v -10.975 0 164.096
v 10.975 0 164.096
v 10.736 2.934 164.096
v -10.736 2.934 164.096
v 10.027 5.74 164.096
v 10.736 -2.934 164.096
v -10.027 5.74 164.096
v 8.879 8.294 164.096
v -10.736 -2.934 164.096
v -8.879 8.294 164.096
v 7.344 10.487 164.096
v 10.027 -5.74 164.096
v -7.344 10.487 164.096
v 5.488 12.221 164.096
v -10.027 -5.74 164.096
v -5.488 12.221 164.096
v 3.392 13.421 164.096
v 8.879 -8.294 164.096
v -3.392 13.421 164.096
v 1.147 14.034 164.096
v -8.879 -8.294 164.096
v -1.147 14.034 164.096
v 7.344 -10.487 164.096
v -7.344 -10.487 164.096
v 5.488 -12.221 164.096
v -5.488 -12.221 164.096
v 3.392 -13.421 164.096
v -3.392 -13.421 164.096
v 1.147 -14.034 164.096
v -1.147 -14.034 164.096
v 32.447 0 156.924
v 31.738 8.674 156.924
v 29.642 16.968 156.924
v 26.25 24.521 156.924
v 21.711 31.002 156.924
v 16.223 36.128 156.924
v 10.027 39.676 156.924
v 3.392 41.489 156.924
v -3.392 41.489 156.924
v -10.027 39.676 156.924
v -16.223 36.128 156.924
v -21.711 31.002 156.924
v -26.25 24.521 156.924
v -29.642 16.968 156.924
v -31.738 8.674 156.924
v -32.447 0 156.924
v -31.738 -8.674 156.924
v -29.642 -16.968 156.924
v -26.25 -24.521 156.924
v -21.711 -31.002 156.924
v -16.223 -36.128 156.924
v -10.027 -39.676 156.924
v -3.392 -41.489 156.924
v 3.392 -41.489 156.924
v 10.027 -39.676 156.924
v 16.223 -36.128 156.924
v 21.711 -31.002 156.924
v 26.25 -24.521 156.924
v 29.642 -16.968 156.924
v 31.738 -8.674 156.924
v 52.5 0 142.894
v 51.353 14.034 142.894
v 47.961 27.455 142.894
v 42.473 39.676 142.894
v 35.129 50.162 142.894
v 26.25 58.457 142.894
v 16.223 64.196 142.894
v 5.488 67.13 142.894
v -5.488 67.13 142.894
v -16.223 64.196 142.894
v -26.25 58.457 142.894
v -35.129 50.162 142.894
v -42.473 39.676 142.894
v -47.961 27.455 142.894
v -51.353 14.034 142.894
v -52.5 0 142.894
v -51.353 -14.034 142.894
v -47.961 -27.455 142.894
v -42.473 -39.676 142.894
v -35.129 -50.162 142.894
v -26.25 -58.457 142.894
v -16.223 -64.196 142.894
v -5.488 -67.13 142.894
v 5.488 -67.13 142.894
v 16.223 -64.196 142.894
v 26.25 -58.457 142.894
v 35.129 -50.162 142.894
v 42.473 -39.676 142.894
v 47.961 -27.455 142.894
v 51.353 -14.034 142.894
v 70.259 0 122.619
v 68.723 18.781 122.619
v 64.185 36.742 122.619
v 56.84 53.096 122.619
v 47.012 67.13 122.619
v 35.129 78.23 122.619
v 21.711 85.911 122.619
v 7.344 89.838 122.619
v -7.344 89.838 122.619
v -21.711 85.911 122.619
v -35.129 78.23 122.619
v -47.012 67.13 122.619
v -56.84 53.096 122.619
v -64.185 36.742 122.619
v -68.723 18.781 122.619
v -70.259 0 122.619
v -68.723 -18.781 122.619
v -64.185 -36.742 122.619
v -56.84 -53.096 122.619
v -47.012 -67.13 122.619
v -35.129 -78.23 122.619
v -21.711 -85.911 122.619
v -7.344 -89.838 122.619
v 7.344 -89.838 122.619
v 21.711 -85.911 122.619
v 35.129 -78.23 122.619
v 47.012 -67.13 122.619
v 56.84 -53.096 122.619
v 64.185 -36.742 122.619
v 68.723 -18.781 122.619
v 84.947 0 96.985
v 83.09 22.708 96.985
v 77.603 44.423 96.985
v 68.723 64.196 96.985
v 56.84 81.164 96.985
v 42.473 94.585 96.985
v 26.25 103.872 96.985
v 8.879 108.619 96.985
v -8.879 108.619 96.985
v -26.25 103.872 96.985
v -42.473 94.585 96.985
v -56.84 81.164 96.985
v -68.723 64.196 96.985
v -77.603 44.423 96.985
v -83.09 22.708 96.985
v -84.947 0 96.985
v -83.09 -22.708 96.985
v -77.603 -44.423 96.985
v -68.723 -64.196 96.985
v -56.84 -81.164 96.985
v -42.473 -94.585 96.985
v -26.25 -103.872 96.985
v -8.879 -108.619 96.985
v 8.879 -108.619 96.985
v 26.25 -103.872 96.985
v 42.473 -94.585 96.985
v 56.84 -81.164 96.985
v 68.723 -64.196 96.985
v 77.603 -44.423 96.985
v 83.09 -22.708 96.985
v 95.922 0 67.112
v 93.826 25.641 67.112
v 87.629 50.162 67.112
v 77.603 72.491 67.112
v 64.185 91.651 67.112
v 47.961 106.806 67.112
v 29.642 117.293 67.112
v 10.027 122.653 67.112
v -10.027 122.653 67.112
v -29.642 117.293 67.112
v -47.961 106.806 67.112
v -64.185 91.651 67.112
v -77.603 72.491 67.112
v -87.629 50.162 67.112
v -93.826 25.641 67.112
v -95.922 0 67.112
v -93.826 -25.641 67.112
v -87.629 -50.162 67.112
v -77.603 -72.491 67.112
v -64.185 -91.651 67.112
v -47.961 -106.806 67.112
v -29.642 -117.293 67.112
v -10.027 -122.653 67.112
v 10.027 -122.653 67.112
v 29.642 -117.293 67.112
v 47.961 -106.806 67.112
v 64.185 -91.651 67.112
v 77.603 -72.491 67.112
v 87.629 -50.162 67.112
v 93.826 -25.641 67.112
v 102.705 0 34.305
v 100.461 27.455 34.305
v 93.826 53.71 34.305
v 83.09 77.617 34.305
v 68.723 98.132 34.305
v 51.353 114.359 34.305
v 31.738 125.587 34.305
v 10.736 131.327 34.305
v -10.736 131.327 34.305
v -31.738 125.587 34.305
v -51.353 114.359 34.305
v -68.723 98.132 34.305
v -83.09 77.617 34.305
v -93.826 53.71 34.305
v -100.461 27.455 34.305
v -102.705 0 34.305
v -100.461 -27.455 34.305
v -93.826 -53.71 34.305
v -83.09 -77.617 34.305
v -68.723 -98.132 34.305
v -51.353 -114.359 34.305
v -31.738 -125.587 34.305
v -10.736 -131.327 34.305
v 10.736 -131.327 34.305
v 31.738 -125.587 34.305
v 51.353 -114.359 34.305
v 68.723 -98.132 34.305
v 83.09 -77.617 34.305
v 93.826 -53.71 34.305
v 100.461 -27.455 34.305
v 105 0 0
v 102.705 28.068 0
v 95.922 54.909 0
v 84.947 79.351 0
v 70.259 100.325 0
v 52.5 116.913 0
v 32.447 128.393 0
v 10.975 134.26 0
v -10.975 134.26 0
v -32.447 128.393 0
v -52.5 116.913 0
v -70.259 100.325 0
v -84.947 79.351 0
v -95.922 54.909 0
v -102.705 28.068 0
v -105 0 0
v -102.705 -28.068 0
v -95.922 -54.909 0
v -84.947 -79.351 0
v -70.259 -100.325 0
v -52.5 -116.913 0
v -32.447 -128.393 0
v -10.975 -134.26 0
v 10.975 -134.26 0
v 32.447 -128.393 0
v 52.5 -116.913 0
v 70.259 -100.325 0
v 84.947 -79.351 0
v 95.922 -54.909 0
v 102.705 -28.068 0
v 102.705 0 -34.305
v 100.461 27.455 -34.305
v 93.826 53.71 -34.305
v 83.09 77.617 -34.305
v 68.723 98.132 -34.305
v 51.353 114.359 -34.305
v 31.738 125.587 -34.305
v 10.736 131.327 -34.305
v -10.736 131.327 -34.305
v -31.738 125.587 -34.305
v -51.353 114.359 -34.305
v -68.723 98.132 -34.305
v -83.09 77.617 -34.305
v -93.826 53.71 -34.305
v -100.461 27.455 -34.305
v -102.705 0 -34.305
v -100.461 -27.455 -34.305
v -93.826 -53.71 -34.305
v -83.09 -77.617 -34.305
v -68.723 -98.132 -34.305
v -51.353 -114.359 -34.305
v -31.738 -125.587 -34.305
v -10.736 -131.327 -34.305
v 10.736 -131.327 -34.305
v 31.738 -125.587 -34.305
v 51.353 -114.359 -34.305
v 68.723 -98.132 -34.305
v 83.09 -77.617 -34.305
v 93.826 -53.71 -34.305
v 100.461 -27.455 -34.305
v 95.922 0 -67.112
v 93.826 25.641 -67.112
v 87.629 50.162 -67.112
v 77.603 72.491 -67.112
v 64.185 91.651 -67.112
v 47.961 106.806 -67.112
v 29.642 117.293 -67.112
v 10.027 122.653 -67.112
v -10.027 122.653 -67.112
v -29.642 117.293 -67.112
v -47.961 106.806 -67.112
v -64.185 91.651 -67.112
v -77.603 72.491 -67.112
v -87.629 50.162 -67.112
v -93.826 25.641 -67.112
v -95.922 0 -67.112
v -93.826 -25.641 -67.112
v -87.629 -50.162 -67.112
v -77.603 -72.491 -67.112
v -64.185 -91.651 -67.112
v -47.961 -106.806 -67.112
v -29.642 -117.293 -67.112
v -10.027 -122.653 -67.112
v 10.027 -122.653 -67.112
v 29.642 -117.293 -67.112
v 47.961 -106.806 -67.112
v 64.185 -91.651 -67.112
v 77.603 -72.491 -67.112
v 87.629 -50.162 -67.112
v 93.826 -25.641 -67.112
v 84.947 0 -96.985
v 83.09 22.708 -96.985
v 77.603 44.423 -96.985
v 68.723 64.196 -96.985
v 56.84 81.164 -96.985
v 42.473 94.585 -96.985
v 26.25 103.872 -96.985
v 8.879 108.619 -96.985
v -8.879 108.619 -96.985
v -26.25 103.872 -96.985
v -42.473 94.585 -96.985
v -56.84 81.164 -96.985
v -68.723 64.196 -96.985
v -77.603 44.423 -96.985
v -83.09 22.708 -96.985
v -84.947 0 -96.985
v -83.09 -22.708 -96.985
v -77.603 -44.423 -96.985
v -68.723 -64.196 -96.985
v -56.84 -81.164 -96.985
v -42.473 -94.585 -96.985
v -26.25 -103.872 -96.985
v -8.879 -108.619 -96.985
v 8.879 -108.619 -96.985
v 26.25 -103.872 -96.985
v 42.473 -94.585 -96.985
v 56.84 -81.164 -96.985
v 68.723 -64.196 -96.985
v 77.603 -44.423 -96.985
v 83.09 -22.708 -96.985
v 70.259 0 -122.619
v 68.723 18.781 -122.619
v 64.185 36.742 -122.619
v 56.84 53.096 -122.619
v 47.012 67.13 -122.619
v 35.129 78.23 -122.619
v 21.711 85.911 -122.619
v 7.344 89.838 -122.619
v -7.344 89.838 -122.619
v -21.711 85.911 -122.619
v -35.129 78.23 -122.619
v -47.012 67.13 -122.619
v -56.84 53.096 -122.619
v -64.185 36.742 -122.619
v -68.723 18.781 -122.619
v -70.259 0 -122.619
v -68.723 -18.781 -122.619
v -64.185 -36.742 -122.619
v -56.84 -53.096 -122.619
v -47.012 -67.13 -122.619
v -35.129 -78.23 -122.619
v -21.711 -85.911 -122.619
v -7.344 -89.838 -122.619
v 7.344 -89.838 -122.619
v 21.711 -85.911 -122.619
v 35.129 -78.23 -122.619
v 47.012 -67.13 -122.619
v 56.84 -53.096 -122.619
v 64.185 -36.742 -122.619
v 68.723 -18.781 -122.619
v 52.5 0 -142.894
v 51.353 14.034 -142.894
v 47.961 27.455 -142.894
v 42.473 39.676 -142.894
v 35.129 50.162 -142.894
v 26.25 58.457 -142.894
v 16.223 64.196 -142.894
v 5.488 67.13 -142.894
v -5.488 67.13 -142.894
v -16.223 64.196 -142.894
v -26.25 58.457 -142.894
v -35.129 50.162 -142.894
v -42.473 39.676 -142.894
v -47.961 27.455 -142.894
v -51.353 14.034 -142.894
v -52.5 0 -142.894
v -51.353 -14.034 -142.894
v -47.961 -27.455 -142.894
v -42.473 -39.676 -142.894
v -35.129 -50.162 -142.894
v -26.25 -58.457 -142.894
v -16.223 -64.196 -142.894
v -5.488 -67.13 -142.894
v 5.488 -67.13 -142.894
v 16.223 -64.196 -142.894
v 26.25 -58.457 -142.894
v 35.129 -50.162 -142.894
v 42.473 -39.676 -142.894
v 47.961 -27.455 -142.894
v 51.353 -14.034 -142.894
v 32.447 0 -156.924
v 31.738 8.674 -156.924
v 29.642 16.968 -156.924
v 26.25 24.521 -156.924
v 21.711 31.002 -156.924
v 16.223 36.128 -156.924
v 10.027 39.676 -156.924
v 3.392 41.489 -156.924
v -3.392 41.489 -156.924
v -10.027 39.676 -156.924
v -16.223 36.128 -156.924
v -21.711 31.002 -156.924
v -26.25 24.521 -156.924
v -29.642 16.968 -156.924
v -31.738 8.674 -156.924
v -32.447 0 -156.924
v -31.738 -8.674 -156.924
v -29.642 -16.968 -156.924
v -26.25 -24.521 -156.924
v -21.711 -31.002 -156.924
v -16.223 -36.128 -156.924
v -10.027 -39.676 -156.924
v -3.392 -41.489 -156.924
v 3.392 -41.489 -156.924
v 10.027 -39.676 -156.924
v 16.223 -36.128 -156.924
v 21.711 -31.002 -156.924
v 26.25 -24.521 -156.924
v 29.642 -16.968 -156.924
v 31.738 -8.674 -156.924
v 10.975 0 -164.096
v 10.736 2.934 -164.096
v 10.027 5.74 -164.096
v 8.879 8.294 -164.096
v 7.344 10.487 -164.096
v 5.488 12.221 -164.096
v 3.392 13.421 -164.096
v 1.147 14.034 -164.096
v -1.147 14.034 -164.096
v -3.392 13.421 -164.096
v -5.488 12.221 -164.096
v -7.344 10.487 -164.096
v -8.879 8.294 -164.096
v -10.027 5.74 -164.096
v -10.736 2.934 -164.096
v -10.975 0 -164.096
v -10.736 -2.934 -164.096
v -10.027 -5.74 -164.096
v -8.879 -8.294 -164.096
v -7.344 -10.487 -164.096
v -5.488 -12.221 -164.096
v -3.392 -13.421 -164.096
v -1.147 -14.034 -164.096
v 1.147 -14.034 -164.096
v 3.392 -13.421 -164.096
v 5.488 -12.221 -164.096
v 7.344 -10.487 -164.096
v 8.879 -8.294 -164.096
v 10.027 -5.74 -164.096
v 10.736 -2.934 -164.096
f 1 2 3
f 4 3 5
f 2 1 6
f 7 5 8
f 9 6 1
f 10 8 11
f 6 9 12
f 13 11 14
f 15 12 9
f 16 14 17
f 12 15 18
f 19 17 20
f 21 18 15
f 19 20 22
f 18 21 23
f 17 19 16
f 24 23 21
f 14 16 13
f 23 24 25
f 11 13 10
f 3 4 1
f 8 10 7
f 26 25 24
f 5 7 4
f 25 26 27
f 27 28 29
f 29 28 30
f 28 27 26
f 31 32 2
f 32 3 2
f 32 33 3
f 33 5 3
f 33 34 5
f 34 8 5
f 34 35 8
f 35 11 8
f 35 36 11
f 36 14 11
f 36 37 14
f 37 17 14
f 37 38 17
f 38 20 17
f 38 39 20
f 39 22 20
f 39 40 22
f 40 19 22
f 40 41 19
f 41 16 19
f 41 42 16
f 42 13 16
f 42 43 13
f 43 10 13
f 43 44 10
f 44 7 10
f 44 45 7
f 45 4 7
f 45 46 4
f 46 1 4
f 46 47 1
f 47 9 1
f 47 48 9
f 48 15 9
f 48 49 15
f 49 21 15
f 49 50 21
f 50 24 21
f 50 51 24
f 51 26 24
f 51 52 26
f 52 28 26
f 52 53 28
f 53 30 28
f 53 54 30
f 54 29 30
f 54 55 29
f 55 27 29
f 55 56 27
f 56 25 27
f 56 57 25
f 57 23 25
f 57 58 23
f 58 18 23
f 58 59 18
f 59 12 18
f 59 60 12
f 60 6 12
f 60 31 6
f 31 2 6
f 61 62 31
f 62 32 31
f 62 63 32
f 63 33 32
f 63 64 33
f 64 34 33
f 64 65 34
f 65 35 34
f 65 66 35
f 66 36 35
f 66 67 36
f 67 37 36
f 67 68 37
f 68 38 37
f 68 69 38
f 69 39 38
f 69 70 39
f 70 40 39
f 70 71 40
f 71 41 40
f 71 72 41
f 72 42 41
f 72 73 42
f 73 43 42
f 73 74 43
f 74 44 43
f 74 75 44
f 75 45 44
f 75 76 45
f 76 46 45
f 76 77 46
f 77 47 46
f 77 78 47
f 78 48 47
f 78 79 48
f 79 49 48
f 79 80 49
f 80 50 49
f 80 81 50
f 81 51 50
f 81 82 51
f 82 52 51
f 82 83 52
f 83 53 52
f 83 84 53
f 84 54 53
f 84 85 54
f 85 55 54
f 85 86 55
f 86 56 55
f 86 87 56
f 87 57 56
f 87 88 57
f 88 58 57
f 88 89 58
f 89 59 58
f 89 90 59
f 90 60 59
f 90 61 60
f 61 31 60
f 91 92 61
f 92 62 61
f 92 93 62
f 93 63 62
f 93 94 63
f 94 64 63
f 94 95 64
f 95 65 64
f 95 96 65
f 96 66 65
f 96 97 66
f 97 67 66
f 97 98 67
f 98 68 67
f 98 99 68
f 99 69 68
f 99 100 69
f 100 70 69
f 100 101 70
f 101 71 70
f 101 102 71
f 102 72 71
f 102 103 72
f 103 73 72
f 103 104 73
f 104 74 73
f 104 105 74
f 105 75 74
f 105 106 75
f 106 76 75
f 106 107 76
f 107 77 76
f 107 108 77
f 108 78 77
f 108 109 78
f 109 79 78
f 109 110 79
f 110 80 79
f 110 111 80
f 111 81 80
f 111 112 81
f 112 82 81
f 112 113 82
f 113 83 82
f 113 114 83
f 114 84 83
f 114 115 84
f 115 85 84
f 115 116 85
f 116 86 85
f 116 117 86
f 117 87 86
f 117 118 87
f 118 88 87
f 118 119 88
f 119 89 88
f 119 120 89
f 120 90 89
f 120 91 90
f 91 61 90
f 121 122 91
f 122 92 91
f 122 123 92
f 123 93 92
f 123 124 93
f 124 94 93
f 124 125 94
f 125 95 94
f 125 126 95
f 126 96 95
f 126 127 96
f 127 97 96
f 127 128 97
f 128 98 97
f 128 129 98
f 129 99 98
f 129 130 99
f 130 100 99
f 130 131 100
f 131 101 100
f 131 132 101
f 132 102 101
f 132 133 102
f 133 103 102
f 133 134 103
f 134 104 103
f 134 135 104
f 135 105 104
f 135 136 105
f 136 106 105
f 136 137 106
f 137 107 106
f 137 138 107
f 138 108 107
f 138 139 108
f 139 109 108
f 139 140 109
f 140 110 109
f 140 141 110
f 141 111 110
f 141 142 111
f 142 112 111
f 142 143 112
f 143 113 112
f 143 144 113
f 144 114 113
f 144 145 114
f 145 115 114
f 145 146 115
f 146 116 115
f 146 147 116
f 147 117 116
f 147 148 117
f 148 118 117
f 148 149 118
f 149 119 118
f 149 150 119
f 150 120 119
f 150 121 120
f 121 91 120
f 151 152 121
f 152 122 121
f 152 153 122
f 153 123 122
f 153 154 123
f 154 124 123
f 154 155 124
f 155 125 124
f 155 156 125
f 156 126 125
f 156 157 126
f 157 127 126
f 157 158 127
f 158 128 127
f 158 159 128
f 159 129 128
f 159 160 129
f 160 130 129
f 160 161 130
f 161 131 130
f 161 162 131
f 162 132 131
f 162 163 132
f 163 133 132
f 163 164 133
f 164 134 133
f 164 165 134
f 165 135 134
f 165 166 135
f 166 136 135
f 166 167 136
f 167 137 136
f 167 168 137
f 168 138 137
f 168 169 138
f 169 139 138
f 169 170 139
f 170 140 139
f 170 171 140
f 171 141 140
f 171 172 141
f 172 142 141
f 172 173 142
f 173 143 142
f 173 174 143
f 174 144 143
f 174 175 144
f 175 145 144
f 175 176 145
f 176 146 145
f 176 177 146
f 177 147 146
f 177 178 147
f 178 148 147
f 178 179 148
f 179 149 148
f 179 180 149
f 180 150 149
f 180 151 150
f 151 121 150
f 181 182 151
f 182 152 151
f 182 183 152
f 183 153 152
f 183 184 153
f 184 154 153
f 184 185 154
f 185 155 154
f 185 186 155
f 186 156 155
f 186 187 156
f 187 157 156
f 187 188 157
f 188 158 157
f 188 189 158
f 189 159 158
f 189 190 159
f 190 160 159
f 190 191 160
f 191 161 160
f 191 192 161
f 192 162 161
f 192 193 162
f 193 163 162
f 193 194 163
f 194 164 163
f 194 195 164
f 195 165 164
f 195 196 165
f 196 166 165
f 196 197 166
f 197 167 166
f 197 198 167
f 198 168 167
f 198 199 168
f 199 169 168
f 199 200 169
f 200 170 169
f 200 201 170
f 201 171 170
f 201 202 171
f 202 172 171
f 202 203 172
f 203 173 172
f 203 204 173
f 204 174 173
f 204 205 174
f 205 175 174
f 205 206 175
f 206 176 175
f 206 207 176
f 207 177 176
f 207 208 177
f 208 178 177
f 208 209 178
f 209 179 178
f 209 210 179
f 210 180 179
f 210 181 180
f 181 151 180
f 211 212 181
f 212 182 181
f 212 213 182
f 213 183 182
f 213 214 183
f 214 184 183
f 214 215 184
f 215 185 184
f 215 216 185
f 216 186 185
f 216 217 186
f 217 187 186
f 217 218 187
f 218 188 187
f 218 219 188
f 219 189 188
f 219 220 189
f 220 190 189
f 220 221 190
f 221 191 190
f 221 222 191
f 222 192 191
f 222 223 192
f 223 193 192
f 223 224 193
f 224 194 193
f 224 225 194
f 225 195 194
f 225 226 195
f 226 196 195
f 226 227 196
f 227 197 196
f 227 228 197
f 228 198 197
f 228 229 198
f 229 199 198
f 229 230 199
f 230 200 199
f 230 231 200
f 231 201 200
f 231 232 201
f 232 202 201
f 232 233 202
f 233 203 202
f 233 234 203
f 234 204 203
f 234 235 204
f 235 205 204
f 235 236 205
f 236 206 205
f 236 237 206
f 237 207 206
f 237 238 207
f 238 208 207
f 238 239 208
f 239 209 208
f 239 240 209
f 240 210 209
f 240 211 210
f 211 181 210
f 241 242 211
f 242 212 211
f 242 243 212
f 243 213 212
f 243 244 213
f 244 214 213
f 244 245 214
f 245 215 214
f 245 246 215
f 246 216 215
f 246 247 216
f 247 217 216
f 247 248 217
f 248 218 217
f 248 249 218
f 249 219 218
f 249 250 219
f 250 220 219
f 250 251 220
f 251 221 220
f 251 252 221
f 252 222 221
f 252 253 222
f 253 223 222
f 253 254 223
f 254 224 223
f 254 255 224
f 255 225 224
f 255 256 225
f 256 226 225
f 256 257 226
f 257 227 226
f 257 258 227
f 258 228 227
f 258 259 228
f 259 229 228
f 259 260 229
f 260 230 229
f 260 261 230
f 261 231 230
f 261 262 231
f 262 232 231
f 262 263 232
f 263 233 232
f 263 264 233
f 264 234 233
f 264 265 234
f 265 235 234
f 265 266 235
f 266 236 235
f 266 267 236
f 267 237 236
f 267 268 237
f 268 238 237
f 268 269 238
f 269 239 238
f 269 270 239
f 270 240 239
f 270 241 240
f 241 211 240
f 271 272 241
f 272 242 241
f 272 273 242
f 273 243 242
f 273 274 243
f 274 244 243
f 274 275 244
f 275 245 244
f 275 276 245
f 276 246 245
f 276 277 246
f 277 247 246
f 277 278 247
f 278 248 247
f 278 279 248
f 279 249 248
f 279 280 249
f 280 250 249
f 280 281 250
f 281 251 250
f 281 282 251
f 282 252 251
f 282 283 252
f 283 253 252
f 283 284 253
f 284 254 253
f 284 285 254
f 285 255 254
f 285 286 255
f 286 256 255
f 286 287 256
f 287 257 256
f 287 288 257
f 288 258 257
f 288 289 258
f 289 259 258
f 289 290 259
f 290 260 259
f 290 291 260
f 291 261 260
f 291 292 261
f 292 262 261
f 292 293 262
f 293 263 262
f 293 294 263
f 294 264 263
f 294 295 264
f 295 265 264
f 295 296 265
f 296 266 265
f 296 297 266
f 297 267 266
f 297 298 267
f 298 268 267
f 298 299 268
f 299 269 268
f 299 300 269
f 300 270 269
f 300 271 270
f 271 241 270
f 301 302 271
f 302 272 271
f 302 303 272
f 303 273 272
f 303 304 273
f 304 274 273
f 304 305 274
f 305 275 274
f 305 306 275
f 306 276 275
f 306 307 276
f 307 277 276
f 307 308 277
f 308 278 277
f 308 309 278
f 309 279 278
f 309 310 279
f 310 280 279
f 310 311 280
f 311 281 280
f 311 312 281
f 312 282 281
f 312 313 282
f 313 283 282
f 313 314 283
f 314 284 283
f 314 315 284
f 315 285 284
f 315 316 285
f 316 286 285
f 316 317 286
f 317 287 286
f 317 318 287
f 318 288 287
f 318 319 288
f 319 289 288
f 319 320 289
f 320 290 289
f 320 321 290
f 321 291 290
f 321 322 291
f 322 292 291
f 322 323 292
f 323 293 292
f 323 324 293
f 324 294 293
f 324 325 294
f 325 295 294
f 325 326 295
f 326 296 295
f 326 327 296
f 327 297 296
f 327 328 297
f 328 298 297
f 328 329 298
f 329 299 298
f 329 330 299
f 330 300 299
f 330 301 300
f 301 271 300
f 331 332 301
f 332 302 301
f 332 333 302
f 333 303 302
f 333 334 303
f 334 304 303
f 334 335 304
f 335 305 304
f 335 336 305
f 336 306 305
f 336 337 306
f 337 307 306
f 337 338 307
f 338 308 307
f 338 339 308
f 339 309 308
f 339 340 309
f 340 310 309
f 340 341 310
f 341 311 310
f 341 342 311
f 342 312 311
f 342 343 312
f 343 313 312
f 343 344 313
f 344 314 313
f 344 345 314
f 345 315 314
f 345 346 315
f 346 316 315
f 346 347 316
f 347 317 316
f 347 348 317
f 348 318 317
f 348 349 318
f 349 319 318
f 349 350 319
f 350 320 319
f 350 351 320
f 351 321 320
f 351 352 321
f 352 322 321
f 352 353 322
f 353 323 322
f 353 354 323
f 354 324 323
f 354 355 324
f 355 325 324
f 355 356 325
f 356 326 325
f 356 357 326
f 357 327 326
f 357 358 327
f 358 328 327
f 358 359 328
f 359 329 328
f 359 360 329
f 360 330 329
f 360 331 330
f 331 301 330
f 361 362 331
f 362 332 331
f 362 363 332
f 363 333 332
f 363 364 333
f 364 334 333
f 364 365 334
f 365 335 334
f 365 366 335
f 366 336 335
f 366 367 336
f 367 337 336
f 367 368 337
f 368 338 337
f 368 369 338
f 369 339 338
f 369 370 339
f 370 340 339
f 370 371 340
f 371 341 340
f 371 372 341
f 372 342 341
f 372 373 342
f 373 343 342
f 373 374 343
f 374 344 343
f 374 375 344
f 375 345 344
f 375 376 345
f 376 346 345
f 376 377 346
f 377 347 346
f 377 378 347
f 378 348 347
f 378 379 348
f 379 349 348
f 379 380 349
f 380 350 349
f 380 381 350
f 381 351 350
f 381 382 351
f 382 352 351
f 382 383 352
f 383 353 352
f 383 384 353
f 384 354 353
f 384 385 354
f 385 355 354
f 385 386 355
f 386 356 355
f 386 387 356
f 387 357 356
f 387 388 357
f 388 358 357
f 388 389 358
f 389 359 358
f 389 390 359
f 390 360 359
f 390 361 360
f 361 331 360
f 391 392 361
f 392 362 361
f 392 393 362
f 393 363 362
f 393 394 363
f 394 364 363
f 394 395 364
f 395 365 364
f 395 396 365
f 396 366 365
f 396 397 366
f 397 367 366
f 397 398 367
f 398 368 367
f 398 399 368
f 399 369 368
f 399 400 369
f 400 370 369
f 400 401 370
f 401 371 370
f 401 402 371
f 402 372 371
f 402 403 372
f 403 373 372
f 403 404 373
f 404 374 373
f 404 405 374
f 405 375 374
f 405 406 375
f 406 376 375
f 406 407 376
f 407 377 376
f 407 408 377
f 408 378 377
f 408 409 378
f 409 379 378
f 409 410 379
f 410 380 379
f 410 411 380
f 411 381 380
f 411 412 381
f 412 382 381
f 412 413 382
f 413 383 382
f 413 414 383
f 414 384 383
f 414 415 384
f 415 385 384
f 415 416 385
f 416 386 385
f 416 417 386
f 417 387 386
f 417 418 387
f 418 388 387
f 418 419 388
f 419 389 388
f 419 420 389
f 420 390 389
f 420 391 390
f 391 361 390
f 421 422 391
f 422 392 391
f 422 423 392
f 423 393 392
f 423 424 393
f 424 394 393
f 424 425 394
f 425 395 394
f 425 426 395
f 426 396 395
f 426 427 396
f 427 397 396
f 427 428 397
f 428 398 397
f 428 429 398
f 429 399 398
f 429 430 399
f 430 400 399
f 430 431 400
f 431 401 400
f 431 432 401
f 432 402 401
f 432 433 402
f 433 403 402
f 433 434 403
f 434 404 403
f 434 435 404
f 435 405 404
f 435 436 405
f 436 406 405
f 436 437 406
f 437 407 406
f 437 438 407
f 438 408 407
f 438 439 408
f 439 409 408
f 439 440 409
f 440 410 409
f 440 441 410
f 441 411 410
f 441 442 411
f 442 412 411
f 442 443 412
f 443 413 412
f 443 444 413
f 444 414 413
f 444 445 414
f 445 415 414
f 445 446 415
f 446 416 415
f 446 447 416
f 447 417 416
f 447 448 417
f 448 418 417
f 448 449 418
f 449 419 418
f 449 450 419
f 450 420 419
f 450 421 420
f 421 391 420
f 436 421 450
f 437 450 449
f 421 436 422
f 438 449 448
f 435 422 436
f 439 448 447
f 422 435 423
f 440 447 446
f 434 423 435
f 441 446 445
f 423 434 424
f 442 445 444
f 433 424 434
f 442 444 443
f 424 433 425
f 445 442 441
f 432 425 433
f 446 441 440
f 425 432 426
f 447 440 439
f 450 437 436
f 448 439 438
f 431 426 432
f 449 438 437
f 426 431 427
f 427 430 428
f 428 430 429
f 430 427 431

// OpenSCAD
// Generated by SolidPython 1.0.1 on 2020-07-29 00:46:47


scale(v = [7, 9, 11]) {
	sphere(r = 15);
}
/***********************************************
*********      SolidPython code:      **********
************************************************
 
# import packages: SolidPython
from solid import *
from solid.utils import *
from itertools import chain, combinations, permutations


class Resize:

    def __init__(self, scad_file):
        self.scad_file = scad_file
        #self.scad_file = import_scad(scad_file)
        # cone/cylinder param:
        self.r1 = 0
        self.r2 = 0
        self.h = 0
        # rectangular prism param:
        self.w = 0
        self.l = 0
        # ellipse param:
        self.r = 0

    # import OpenScad code (file name corresponds to shape)


    # classify shape + parameters
    def assign(self, param1, param2, param3):
        if self.scad_file == 'cone.scad':
            self.r1 = param1
            self.r2 = param2
            self.h = param3
        elif self.scad_file == 'cylinder.scad':
            self.r1 = param1
            self.r2 = param2
            self.h = param3
        elif self.scad_file == 'rectangularPrism.scad':
            self.h = param1
            self.l = param2
            self.w = param3
        else:
            self.r = param1
            self.h = param2

    # resize parameters
    def iterate(self):
        x = range(3, 20, 2)
        i = 1
        if self.scad_file == 'cone.scad':
            tempList = list(permutations(x, 2))
            for temp in tempList:
                param1 = temp[0]
                param2 = temp[1]
                filepath = 'produced_scad_files/' + 'cone' + str(param1) + '_' + str(param2) + '_' + '.scad'
                scad_render_to_file(cylinder(h=param1, r1=param2, r2=0), filepath)

        elif self.scad_file == 'cylinder.scad':
            tempList = list(permutations(x, 3))
            for temp in tempList:
                param1 = temp[0]
                param2 = temp[1]
                filepath = 'produced_scad_files/' + 'cylinder' + str(param1) + '_' + str(param2) + '_' + '.scad'
                scad_render_to_file(cylinder(h=param1, r1=param2, r2=param2), filepath)

        elif self.scad_file == 'rectangularPrism.scad':
            tempList = list(permutations(x, 3))
            for temp in tempList:
                param1 = temp[0]
                param2 = temp[1]
                param3 = temp[2]
                filepath = 'produced_scad_files/' + 'rectangularPrism' + str(param1) + '_' + str(param2) + '_' + str(
                    param3) + '.scad'
                scad_render_to_file(cube(size=(param1, param2, param3)), filepath)

        elif self.scad_file == 'ellipse.scad':
            tempList = list(permutations(x, 4))
            for temp in tempList:
                param1 = temp[0]
                param2 = temp[1]
                param3 = temp[2]
                param4 = temp[3]
                filepath = 'produced_scad_files/' + 'ellipse' + str(param1) + '_' + str(param2) + '_' + str(param3) + '_' + str(param4) + '.scad'
                scad_render_to_file(scale([param1, param2, param3])(sphere(r=param4)), filepath)

    def render_to_scadfile(self):
        scad_render_to_file(scad, 'example.scad') 
 
************************************************/
